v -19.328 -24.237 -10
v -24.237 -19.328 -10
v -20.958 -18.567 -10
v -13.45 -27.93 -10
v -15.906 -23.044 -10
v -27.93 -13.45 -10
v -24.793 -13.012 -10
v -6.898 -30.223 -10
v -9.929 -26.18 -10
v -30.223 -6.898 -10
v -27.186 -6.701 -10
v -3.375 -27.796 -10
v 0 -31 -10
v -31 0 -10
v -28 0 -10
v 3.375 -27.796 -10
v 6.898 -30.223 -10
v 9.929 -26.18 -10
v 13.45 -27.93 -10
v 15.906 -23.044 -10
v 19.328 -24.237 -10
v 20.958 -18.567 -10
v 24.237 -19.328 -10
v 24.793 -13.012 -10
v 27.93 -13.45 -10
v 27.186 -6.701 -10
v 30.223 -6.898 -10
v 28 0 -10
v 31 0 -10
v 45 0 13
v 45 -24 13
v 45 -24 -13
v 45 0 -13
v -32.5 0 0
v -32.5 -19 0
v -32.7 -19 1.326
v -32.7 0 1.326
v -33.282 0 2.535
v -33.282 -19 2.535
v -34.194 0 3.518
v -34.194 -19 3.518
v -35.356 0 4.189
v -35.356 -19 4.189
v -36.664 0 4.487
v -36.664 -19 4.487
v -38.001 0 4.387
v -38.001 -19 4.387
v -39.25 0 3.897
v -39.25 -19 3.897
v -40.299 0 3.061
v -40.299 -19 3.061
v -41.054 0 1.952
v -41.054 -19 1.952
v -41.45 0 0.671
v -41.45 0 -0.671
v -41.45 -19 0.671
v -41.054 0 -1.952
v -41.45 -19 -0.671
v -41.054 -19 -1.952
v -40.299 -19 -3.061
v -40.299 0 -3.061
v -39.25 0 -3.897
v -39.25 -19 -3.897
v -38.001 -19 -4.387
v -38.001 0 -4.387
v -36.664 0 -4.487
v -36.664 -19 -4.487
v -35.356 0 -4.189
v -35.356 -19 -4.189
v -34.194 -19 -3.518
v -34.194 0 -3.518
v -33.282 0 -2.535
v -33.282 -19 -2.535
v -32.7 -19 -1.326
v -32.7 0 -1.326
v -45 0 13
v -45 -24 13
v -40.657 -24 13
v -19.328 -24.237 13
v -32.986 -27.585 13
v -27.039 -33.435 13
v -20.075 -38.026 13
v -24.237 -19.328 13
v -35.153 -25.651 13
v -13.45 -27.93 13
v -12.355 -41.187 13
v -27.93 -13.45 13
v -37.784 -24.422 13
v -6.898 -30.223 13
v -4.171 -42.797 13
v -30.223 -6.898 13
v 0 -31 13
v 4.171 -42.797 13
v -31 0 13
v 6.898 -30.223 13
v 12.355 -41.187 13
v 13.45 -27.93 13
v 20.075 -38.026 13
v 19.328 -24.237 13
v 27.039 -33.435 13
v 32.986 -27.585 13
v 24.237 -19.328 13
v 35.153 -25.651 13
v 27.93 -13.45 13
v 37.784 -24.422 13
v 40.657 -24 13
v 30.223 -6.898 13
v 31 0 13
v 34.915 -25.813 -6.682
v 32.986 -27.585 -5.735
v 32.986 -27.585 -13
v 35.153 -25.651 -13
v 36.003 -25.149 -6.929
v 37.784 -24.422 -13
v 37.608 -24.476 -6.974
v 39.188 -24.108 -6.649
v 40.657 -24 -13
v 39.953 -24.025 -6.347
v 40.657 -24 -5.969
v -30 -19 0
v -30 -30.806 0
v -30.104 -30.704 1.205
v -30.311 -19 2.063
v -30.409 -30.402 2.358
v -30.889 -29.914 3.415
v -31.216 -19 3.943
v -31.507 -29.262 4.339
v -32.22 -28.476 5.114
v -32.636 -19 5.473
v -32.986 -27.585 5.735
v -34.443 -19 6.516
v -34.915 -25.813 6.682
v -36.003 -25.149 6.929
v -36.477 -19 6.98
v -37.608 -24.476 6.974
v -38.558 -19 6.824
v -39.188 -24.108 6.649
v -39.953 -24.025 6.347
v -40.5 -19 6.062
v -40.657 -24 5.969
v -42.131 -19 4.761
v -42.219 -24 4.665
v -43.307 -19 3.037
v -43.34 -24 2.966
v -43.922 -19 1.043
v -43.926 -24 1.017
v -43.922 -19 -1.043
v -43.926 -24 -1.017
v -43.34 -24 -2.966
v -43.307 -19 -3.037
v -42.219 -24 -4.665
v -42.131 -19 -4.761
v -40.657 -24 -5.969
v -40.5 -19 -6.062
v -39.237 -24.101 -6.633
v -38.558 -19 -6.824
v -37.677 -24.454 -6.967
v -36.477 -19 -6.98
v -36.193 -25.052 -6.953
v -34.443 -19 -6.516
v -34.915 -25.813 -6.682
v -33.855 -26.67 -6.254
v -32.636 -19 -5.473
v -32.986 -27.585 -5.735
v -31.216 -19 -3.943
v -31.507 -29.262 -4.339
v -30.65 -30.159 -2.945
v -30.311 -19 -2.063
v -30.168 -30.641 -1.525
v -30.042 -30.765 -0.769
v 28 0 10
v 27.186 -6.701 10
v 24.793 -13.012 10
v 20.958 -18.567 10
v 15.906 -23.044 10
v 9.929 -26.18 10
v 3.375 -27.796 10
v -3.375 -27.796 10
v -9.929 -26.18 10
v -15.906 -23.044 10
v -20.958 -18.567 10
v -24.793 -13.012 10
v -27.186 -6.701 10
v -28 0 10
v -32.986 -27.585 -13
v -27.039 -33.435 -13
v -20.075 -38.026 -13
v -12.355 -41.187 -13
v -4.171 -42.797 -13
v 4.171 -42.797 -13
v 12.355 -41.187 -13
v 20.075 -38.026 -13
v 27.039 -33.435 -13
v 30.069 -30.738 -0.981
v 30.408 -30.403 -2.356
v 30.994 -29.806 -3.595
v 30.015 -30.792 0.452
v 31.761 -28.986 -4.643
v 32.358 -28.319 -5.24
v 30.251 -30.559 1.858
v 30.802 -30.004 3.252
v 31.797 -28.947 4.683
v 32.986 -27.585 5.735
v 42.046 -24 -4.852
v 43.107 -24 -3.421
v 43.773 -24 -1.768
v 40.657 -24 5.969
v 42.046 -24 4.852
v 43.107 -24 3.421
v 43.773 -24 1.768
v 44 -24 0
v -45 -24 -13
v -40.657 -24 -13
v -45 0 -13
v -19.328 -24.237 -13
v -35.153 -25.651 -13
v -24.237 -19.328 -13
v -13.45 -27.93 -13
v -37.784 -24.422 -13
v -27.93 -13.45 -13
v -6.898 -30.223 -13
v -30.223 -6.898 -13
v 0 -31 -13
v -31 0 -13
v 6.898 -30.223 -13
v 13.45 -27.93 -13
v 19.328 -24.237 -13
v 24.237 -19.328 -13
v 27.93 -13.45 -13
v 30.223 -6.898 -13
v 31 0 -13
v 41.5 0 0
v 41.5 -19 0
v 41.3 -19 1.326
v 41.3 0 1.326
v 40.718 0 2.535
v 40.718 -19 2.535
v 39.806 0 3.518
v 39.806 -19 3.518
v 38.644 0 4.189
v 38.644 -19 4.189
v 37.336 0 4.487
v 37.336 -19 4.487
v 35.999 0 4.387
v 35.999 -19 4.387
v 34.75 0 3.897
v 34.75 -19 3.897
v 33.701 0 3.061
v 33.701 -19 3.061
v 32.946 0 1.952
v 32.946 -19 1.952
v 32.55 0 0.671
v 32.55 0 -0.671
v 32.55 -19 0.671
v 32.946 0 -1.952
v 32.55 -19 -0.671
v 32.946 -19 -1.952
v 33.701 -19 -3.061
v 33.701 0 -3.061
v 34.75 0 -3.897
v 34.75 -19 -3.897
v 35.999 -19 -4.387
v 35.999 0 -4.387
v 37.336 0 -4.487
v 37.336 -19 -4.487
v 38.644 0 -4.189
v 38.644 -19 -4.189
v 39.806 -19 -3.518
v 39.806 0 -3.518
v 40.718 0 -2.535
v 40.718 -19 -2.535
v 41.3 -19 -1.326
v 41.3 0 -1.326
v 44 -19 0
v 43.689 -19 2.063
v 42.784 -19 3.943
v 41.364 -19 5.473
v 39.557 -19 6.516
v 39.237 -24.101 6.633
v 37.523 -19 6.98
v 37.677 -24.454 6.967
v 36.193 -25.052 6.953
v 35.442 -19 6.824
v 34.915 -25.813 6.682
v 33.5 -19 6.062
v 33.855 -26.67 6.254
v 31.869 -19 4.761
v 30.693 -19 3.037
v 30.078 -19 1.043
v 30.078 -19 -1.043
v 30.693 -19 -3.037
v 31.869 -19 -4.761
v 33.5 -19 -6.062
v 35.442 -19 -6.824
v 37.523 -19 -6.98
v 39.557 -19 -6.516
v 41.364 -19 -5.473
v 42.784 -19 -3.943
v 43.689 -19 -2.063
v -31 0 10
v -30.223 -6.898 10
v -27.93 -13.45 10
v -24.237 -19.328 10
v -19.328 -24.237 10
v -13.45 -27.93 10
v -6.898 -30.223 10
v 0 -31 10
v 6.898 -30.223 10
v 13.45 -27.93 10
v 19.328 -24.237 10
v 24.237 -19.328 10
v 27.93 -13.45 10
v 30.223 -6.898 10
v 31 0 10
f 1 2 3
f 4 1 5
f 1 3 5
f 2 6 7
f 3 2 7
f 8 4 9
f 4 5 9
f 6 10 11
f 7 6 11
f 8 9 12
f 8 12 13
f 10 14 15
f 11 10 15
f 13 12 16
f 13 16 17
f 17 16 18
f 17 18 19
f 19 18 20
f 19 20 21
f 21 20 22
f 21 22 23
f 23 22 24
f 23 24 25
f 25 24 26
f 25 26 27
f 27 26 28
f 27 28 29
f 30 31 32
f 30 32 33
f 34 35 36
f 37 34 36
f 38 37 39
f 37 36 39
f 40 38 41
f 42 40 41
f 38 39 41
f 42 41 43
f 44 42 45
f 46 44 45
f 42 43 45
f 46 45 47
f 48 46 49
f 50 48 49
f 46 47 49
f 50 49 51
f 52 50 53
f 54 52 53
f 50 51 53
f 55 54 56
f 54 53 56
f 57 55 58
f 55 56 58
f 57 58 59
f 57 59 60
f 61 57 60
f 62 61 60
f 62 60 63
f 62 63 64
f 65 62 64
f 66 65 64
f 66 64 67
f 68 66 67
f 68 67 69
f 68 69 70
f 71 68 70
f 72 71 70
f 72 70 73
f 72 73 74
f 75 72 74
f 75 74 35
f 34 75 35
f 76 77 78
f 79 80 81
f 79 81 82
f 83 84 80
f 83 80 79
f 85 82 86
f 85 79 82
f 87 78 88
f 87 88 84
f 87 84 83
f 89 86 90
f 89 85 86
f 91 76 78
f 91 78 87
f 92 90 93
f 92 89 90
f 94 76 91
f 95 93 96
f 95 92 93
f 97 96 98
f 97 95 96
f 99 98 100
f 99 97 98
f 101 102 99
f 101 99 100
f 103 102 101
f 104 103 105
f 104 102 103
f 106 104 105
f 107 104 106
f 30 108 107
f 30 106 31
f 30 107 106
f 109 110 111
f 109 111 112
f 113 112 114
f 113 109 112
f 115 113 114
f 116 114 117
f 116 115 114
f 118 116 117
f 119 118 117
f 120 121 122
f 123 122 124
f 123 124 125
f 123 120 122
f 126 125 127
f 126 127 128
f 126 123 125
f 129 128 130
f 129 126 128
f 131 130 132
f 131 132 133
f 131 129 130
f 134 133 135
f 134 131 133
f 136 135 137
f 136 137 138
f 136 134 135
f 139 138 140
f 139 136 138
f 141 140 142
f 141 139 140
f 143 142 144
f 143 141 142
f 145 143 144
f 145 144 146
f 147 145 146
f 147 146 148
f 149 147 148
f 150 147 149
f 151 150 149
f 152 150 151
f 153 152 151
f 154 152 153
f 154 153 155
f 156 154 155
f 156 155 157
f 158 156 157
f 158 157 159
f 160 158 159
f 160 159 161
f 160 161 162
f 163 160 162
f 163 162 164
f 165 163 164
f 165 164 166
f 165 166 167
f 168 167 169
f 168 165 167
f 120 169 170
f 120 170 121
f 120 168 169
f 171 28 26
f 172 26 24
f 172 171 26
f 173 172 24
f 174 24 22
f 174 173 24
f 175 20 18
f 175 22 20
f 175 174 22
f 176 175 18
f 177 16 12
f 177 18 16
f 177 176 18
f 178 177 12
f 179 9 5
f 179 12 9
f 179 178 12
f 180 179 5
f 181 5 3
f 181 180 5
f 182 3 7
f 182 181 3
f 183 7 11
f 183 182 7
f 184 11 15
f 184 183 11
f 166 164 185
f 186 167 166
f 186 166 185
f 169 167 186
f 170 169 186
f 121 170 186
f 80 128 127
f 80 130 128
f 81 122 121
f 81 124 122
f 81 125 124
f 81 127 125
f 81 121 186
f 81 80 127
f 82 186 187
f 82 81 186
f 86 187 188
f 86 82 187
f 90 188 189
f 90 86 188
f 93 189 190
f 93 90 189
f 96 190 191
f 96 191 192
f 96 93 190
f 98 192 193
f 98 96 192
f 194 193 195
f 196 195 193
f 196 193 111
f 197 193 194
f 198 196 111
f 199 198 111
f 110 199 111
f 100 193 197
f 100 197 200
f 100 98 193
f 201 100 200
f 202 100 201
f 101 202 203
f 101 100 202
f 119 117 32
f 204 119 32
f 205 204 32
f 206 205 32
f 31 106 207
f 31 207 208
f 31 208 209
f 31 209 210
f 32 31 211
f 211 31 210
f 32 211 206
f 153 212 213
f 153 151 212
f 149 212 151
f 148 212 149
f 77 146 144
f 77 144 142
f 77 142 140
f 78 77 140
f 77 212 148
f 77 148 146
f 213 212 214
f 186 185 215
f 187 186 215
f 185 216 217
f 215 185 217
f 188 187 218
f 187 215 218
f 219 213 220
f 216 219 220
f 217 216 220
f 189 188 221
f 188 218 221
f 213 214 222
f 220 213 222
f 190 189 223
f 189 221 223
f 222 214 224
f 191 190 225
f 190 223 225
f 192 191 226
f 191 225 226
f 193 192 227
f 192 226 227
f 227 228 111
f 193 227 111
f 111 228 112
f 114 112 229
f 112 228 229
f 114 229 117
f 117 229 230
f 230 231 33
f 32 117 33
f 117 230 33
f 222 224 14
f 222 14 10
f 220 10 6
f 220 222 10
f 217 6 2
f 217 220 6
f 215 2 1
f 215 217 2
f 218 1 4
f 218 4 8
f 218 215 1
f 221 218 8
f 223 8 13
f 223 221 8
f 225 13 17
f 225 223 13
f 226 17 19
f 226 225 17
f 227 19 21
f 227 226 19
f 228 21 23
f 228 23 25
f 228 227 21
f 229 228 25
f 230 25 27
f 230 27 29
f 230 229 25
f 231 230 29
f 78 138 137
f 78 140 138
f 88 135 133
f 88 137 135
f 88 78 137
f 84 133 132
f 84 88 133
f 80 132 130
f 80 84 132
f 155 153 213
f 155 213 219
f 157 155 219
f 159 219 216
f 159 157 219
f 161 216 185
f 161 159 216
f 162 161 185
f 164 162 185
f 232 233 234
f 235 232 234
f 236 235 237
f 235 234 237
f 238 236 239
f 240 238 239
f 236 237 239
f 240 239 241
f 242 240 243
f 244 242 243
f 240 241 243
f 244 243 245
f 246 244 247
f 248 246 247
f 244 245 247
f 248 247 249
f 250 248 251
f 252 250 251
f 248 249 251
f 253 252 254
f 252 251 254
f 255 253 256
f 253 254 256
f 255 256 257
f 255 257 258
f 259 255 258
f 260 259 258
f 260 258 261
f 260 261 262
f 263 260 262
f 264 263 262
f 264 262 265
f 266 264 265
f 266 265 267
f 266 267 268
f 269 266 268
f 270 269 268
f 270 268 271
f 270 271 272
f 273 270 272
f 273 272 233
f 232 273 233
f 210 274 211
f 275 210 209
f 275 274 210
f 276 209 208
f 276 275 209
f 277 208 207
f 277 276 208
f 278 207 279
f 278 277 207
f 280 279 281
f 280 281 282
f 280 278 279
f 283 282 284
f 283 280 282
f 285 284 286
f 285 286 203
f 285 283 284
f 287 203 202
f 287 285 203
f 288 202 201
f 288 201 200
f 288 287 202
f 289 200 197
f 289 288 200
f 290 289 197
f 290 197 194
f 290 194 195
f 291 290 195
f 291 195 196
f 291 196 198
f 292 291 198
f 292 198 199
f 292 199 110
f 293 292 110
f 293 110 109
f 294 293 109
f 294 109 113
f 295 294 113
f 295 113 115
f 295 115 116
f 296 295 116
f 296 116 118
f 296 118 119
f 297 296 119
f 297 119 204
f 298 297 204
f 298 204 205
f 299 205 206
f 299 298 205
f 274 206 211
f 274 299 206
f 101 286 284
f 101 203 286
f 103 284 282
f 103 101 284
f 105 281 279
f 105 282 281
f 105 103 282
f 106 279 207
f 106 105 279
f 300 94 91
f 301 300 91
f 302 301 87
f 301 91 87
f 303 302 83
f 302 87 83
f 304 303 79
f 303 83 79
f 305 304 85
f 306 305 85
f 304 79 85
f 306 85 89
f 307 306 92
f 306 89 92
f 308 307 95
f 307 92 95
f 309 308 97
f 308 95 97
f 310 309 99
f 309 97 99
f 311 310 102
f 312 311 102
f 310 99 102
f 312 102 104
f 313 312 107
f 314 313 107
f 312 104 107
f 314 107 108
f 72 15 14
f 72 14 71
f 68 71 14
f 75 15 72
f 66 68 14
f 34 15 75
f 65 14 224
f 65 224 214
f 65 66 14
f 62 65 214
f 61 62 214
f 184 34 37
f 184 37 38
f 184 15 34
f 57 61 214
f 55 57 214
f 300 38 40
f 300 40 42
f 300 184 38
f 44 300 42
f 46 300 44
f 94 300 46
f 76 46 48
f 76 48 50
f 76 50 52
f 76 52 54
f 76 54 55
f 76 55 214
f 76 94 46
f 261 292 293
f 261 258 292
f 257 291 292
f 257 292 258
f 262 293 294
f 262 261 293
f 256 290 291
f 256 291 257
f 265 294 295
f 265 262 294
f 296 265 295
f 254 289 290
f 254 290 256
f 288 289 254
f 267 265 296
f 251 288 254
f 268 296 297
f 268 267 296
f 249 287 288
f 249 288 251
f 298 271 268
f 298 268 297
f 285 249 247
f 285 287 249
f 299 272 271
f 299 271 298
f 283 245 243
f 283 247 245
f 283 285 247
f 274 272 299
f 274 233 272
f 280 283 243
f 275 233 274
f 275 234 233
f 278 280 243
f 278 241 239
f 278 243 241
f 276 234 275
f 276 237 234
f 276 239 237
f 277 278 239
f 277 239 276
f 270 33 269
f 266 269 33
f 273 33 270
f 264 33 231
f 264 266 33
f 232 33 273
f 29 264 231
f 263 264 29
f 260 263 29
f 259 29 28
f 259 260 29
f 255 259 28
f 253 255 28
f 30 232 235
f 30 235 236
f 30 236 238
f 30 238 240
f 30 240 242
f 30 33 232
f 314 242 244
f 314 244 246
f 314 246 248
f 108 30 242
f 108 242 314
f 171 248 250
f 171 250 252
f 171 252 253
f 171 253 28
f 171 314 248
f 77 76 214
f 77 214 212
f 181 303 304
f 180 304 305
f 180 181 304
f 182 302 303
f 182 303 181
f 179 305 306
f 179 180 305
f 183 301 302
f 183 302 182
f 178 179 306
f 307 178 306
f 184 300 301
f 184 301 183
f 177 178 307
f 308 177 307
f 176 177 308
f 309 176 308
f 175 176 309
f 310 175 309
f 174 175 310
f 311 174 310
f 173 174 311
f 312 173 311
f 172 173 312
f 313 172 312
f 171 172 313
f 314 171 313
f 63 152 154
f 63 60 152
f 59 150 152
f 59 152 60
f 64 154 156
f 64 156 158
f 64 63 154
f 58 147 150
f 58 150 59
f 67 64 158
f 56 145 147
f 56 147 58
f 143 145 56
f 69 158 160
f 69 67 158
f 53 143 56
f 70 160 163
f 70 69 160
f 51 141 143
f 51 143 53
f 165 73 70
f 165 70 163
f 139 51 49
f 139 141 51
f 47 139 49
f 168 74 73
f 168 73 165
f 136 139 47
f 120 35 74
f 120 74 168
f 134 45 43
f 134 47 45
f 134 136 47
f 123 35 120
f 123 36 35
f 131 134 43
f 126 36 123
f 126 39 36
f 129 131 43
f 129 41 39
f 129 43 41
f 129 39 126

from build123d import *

# Parameters (mm, degrees)
EXTRUDE_1_DEPTH          = 13
SKETCH_3_R               = 31
CUT_EXTRUDE_1_DEPTH      = 3
CUT_EXTRUDE_3_DEPTH      = 53.630789468
CUT_EXTRUDE_3_DEPTH_BACK = 5
SKETCH_9_R               = 7
SKETCH_10_R              = 4.5
CUT_EXTRUDE_4_DEPTH      = 53.630789538


with BuildPart() as part:
    # Эскиз1 → Бобышка-Вытянуть1 (new, symmetric)
    with BuildSketch(Plane.XY):
        with BuildLine():
            Line((-28, 0), (-45, 0))
            Line((-45, 0), (-45, -24))
            Line((-45, -24), (-40.657102701, -24))
            ThreePointArc((-40.657102701, -24), (-36.423365781, -24.940448593), (-32.985951248, -27.58490566))
            ThreePointArc((-32.985951248, -27.58490566), (0, -43), (32.985951248, -27.58490566))
            ThreePointArc((32.985951248, -27.58490566), (36.423365781, -24.940448593), (40.657102701, -24))
            Line((40.657102701, -24), (45, -24))
            Line((45, -24), (45, 0))
            Line((45, 0), (28, 0))
            ThreePointArc((28, 0), (0, -28), (-28, 0))
        make_face()
    extrude(amount=EXTRUDE_1_DEPTH, both=True)

    # Эскиз3 → Вырез-Вытянуть1 (cut)
    with BuildSketch(Plane.XY.offset(-13)):
        Circle(SKETCH_3_R)
    cut_extrude_1 = extrude(amount=CUT_EXTRUDE_1_DEPTH, mode=Mode.SUBTRACT)

    # Зеркальное отражение2: Вырез-Вытянуть1 across plane
    add(cut_extrude_1.mirror(Plane.XY), mode=Mode.SUBTRACT)

    # Эскиз9 → Вырез-Вытянуть3 (cut, two sides: drawn at the far end of the back side and taken through both)
    with BuildSketch(Plane.XZ.offset(24).offset(-CUT_EXTRUDE_3_DEPTH_BACK)):
        with Locations((-37, 0)):
            Circle(SKETCH_9_R)
        with Locations((37, 0)):
            Circle(SKETCH_9_R)
    extrude(amount=CUT_EXTRUDE_3_DEPTH + CUT_EXTRUDE_3_DEPTH_BACK, mode=Mode.SUBTRACT)

    # Эскиз10 → Вырез-Вытянуть4 (cut, through all)
    with BuildSketch(Plane.XZ.offset(19)):
        with Locations((-37, 0)):
            Circle(SKETCH_10_R)
        with Locations((37, 0)):
            Circle(SKETCH_10_R)
    extrude(amount=-CUT_EXTRUDE_4_DEPTH, mode=Mode.SUBTRACT)


solid = part.part
